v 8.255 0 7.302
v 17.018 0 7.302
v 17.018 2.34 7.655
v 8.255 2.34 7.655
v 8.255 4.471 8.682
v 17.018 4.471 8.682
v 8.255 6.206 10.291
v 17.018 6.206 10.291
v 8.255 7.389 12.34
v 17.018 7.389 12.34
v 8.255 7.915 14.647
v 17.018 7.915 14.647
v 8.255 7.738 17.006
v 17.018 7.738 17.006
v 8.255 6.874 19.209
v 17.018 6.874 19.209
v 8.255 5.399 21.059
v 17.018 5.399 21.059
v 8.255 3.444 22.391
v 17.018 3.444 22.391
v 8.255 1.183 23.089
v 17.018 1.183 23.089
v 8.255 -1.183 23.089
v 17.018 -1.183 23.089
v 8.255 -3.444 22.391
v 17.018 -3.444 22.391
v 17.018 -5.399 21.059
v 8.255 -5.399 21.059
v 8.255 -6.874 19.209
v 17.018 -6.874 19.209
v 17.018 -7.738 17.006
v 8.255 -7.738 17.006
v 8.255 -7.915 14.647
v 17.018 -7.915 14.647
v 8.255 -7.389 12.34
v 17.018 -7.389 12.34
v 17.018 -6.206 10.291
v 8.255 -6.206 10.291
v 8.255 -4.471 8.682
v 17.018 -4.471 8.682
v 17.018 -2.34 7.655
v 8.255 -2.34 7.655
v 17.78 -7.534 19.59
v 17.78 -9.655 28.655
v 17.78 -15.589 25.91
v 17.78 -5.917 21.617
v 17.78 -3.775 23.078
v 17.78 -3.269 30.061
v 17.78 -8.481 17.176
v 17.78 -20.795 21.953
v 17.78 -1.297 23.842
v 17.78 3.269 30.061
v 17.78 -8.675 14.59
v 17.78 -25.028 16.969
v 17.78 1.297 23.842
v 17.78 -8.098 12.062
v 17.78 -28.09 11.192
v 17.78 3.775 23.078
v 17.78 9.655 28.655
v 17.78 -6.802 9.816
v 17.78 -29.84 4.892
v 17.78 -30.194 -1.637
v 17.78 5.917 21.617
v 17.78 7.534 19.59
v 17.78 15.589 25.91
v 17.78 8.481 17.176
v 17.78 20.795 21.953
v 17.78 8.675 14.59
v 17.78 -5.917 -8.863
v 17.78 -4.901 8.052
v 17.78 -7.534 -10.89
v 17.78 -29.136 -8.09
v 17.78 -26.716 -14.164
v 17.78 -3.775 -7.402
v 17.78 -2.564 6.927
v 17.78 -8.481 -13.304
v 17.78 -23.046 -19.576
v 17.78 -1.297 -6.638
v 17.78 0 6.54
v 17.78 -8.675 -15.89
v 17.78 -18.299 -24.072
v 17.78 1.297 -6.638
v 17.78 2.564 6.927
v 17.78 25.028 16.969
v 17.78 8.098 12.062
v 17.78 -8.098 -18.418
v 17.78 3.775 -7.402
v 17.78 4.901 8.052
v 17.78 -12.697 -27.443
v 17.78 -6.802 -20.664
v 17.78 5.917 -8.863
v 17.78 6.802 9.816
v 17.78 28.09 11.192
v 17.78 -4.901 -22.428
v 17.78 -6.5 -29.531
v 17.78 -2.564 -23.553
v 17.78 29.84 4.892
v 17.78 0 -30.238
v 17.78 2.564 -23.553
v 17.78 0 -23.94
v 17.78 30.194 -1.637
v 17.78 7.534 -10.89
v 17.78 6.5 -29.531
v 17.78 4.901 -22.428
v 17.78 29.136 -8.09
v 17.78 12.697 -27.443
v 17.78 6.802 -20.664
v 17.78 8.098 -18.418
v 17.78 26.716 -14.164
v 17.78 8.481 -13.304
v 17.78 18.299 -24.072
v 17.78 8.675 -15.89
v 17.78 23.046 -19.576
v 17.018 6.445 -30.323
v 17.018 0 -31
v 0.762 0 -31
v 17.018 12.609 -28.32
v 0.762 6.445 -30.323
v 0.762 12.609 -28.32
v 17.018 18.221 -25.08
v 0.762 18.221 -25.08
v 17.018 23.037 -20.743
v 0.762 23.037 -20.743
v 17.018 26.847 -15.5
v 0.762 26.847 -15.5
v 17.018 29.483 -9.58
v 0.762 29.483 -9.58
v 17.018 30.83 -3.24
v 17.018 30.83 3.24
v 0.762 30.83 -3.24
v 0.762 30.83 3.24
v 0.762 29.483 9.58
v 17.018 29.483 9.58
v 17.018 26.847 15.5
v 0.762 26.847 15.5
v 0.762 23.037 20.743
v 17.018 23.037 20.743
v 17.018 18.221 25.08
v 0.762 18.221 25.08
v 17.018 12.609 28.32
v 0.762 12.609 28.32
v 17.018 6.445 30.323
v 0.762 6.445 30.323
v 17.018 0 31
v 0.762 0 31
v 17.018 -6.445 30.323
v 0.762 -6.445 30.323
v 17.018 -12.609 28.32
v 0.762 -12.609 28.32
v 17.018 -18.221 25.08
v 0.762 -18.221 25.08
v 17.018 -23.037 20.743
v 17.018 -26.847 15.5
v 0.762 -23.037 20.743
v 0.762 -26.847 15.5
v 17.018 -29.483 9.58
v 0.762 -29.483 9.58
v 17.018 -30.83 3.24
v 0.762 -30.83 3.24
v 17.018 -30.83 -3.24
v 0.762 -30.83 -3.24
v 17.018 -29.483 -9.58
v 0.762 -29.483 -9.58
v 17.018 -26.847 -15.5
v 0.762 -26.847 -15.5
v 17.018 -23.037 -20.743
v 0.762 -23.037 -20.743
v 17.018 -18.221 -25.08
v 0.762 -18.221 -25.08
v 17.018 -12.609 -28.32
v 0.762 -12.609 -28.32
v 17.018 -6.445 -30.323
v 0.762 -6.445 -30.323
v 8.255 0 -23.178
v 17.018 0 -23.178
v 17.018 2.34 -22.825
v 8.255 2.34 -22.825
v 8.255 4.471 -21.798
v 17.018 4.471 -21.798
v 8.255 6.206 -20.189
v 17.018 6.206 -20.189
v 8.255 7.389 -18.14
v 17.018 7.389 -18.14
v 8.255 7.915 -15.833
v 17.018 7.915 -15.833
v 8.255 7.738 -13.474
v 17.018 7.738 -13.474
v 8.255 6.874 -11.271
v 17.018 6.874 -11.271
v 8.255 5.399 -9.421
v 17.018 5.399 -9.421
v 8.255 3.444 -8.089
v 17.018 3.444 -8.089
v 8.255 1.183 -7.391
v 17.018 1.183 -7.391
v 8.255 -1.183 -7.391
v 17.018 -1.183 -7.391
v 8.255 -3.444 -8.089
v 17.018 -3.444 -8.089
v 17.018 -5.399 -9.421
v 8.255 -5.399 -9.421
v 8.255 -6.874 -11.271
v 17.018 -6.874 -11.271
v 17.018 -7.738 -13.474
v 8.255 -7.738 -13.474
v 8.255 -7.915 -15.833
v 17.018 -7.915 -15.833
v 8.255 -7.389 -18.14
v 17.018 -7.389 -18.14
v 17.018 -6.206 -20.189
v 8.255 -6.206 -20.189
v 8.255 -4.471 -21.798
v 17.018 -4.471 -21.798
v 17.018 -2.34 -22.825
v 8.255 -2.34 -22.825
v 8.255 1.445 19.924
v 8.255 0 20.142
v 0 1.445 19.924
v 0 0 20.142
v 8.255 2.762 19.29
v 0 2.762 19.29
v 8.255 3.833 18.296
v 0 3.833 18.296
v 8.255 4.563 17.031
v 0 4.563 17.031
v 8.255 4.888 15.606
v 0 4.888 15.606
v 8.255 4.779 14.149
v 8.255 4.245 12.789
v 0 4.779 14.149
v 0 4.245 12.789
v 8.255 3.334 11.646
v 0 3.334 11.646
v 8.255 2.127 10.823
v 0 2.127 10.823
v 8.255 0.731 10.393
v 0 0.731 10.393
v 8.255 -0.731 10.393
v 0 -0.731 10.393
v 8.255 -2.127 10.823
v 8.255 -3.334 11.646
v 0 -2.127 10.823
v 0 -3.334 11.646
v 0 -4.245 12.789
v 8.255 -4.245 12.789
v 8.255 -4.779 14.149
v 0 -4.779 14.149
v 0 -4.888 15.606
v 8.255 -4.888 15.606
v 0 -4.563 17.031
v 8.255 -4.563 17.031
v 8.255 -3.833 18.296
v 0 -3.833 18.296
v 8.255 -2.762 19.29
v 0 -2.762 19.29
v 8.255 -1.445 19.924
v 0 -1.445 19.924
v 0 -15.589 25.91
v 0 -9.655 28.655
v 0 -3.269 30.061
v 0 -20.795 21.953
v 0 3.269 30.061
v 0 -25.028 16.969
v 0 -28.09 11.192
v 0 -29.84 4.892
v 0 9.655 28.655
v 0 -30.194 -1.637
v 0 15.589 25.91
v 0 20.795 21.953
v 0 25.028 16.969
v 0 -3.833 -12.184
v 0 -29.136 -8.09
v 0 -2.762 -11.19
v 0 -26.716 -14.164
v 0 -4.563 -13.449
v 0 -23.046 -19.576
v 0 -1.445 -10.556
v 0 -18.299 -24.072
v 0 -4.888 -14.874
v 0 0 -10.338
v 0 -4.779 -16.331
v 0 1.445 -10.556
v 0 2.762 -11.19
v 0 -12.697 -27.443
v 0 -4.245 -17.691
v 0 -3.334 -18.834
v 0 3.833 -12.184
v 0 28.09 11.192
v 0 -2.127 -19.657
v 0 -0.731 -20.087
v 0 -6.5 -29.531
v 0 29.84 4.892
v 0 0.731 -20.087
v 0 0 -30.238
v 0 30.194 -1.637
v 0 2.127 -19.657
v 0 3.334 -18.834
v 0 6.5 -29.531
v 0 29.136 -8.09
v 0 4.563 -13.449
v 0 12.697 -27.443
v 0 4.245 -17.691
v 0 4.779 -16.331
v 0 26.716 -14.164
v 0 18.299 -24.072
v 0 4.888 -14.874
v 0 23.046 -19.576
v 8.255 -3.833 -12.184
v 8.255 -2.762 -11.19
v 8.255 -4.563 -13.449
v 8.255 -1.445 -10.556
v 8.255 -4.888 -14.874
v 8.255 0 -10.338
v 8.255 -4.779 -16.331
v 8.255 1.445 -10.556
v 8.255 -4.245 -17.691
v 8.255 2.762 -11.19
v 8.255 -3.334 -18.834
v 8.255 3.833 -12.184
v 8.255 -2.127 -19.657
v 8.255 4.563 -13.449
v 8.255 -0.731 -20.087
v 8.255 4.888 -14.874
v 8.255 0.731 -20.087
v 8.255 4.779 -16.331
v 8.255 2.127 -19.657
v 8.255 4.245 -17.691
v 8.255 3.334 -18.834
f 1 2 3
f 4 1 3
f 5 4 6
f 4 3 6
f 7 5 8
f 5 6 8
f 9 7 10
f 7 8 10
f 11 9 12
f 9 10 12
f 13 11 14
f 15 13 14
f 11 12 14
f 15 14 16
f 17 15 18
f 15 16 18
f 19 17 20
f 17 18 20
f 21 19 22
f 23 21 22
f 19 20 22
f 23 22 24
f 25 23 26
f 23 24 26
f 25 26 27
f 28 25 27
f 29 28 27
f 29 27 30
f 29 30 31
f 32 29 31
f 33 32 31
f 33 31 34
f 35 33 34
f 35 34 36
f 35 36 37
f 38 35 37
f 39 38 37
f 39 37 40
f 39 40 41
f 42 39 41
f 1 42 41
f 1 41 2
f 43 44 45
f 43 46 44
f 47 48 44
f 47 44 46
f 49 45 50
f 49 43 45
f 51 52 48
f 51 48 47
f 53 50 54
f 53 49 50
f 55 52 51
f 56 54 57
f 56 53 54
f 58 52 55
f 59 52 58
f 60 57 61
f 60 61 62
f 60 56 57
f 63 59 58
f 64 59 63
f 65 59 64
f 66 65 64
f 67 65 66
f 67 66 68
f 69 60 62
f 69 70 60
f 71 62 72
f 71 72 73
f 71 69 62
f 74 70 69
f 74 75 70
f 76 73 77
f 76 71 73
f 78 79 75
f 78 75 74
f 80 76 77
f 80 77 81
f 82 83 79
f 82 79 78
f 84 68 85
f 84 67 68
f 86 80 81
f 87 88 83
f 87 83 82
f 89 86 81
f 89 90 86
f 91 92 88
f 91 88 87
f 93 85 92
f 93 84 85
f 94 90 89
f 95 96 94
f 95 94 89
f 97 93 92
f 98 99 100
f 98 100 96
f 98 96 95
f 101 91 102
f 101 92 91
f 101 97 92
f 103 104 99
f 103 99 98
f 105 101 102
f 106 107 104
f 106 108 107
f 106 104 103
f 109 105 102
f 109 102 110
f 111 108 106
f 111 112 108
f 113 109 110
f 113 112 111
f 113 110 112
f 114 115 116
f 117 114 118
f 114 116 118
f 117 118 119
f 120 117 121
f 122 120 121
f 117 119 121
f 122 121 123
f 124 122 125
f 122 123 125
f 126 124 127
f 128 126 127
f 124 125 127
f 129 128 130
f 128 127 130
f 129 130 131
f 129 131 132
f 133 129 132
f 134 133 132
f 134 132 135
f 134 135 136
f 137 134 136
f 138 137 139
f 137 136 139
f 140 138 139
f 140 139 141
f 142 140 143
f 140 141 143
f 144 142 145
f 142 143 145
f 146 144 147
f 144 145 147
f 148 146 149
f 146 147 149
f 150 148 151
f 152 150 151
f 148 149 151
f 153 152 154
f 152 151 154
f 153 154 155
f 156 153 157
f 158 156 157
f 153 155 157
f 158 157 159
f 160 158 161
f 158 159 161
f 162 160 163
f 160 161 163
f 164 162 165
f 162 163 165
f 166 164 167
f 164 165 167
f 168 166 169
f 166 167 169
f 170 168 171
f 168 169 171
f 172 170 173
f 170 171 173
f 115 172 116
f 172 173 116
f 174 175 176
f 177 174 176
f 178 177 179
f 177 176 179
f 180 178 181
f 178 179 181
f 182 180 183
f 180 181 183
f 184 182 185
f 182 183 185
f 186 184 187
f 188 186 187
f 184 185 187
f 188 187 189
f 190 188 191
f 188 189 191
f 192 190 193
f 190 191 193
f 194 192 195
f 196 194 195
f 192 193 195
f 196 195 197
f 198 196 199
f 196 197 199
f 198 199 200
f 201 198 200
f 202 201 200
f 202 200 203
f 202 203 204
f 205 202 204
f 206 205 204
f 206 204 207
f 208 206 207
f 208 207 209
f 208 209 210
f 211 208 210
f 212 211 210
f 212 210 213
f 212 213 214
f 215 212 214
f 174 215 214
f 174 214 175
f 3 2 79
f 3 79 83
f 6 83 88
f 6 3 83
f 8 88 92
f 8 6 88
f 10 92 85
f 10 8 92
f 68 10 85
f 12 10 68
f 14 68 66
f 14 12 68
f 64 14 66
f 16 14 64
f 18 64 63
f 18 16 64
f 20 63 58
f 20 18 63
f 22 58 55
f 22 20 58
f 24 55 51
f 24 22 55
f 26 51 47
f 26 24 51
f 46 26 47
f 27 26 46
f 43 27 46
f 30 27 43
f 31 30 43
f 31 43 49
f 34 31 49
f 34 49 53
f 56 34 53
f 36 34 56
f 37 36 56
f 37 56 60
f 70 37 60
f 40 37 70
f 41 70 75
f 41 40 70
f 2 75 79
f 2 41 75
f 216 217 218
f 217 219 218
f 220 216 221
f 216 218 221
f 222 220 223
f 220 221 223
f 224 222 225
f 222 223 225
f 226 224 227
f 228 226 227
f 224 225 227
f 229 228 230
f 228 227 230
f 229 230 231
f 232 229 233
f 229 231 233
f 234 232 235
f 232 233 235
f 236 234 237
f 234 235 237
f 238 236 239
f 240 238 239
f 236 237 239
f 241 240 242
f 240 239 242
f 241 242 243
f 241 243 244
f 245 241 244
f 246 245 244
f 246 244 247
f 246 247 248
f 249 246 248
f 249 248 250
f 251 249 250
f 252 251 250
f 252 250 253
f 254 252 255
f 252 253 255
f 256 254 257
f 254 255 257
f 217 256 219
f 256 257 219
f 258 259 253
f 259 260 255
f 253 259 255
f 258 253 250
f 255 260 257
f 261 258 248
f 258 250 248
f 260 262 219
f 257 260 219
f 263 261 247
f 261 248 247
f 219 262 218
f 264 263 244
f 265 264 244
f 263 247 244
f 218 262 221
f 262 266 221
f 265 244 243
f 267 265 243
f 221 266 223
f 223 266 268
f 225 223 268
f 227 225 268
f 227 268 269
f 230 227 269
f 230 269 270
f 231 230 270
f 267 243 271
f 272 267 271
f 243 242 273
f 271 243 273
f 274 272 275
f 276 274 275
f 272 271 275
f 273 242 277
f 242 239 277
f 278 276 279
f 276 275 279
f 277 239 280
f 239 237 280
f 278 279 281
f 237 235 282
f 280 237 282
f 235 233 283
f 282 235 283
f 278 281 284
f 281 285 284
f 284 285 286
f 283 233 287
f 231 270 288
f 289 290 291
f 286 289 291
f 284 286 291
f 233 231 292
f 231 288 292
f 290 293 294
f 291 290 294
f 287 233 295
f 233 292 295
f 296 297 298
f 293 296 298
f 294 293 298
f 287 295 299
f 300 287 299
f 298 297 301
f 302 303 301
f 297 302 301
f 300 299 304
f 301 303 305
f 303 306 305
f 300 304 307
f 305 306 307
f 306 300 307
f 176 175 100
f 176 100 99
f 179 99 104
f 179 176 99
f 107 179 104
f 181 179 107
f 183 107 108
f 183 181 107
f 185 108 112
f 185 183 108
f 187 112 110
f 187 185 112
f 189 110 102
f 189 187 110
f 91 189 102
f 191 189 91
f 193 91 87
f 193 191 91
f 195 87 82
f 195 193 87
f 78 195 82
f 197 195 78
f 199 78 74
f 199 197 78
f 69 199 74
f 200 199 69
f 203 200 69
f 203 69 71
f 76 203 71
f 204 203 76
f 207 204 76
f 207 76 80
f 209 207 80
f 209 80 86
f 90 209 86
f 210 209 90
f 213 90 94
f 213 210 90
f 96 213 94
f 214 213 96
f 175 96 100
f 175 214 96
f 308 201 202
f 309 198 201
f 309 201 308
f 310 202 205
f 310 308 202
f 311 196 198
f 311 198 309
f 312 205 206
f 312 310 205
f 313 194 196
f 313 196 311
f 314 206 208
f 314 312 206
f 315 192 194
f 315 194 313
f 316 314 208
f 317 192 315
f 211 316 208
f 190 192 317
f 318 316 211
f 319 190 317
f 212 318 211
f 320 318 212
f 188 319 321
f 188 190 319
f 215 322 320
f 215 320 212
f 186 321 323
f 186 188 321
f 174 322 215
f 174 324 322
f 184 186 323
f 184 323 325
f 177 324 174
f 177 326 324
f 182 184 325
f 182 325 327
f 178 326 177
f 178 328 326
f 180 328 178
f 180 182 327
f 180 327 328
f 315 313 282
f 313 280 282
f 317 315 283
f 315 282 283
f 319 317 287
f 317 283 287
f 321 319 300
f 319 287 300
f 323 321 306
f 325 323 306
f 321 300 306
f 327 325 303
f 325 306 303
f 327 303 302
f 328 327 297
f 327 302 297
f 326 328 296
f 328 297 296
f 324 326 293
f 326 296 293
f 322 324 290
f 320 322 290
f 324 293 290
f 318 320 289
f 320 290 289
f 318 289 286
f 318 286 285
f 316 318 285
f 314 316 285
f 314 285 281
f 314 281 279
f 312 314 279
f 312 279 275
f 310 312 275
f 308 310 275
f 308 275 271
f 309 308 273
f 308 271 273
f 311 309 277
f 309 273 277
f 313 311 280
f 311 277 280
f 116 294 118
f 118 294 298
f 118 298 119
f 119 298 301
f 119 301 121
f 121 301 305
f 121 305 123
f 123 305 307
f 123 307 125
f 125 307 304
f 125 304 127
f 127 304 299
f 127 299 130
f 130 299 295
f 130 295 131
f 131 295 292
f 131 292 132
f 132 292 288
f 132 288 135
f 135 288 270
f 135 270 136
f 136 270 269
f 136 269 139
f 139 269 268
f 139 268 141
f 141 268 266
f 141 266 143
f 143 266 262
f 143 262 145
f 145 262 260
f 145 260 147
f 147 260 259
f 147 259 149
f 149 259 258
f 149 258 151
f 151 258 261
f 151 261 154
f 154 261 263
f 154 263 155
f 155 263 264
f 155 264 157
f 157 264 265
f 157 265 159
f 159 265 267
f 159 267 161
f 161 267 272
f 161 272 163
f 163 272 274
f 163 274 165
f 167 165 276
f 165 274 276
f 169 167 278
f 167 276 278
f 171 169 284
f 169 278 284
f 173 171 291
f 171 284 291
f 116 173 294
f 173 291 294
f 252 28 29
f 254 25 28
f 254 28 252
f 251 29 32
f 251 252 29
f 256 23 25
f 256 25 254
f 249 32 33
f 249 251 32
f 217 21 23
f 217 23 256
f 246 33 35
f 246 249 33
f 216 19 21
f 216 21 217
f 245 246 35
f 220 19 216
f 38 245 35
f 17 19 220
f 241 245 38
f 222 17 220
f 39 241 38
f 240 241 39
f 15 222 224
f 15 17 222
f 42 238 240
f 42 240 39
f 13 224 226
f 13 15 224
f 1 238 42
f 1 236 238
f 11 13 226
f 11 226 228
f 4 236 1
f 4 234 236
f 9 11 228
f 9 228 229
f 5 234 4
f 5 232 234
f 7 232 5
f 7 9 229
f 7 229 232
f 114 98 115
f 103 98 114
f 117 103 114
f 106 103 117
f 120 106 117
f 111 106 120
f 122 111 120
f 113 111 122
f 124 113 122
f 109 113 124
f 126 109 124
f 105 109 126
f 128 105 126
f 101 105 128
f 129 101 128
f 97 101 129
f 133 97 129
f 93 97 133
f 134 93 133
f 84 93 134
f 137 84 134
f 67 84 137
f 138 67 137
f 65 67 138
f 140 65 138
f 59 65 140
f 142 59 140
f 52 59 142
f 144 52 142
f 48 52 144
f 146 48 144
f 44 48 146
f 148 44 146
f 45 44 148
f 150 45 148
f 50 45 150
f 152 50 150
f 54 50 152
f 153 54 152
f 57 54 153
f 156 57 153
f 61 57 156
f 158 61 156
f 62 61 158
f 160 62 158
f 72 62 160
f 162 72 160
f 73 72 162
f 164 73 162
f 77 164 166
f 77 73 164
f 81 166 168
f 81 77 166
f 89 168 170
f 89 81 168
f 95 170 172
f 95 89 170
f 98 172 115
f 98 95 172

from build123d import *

# Parameters (mm, degrees)
SKETCH1_R                                        = 31
BOSS_EXTRUDE1_DEPTH                              = 17.78
CBORE_FOR_3_8_SOCKET_HEAD_CAP_SCREW1_D           = 9.8044
CBORE_FOR_3_8_SOCKET_HEAD_CAP_SCREW1_DEPTH       = 23.8252
CBORE_FOR_3_8_SOCKET_HEAD_CAP_SCREW1_CBORE_D     = 15.875
CBORE_FOR_3_8_SOCKET_HEAD_CAP_SCREW1_CBORE_DEPTH = 9.525
CBORE_FOR_3_8_SOCKET_HEAD_CAP_SCREW1_TIP         = 2.945538927
CHAMFER1_SIZE                                    = 0.762


with BuildPart() as part:
    # Sketch1 → Boss-Extrude1 (new body)
    with BuildSketch(Plane(origin=(0, 0, 0), x_dir=(0, 0, -1), z_dir=(1, 0, 0))):
        Circle(SKETCH1_R)
    extrude(amount=BOSS_EXTRUDE1_DEPTH)

    # CBORE for 3/8 Socket Head Cap Screw1
    with Locations(Plane(origin=(17.78, 0, 0), x_dir=(0, 0, -1), z_dir=(1, 0, 0))):
        with Locations((-15.24, 0), (15.24, 0)):
            CounterBoreHole(CBORE_FOR_3_8_SOCKET_HEAD_CAP_SCREW1_D / 2, CBORE_FOR_3_8_SOCKET_HEAD_CAP_SCREW1_CBORE_D / 2, CBORE_FOR_3_8_SOCKET_HEAD_CAP_SCREW1_CBORE_DEPTH, depth=CBORE_FOR_3_8_SOCKET_HEAD_CAP_SCREW1_DEPTH)
            with Locations((0, 0, -(CBORE_FOR_3_8_SOCKET_HEAD_CAP_SCREW1_DEPTH + CBORE_FOR_3_8_SOCKET_HEAD_CAP_SCREW1_TIP / 2))):  # 118° drill point
                Cone(0, CBORE_FOR_3_8_SOCKET_HEAD_CAP_SCREW1_D / 2, CBORE_FOR_3_8_SOCKET_HEAD_CAP_SCREW1_TIP, mode=Mode.SUBTRACT)

    # Chamfer1
    chamfer1_edges = [part.edges().sort_by_distance(p)[0] for p in [
        (17.78, 0, 23.1775),
        (0, 0, 31),
        (17.78, 0, 31),
        (17.78, 0, -7.3025),
    ]]
    chamfer(chamfer1_edges, length=CHAMFER1_SIZE)


solid = part.part
